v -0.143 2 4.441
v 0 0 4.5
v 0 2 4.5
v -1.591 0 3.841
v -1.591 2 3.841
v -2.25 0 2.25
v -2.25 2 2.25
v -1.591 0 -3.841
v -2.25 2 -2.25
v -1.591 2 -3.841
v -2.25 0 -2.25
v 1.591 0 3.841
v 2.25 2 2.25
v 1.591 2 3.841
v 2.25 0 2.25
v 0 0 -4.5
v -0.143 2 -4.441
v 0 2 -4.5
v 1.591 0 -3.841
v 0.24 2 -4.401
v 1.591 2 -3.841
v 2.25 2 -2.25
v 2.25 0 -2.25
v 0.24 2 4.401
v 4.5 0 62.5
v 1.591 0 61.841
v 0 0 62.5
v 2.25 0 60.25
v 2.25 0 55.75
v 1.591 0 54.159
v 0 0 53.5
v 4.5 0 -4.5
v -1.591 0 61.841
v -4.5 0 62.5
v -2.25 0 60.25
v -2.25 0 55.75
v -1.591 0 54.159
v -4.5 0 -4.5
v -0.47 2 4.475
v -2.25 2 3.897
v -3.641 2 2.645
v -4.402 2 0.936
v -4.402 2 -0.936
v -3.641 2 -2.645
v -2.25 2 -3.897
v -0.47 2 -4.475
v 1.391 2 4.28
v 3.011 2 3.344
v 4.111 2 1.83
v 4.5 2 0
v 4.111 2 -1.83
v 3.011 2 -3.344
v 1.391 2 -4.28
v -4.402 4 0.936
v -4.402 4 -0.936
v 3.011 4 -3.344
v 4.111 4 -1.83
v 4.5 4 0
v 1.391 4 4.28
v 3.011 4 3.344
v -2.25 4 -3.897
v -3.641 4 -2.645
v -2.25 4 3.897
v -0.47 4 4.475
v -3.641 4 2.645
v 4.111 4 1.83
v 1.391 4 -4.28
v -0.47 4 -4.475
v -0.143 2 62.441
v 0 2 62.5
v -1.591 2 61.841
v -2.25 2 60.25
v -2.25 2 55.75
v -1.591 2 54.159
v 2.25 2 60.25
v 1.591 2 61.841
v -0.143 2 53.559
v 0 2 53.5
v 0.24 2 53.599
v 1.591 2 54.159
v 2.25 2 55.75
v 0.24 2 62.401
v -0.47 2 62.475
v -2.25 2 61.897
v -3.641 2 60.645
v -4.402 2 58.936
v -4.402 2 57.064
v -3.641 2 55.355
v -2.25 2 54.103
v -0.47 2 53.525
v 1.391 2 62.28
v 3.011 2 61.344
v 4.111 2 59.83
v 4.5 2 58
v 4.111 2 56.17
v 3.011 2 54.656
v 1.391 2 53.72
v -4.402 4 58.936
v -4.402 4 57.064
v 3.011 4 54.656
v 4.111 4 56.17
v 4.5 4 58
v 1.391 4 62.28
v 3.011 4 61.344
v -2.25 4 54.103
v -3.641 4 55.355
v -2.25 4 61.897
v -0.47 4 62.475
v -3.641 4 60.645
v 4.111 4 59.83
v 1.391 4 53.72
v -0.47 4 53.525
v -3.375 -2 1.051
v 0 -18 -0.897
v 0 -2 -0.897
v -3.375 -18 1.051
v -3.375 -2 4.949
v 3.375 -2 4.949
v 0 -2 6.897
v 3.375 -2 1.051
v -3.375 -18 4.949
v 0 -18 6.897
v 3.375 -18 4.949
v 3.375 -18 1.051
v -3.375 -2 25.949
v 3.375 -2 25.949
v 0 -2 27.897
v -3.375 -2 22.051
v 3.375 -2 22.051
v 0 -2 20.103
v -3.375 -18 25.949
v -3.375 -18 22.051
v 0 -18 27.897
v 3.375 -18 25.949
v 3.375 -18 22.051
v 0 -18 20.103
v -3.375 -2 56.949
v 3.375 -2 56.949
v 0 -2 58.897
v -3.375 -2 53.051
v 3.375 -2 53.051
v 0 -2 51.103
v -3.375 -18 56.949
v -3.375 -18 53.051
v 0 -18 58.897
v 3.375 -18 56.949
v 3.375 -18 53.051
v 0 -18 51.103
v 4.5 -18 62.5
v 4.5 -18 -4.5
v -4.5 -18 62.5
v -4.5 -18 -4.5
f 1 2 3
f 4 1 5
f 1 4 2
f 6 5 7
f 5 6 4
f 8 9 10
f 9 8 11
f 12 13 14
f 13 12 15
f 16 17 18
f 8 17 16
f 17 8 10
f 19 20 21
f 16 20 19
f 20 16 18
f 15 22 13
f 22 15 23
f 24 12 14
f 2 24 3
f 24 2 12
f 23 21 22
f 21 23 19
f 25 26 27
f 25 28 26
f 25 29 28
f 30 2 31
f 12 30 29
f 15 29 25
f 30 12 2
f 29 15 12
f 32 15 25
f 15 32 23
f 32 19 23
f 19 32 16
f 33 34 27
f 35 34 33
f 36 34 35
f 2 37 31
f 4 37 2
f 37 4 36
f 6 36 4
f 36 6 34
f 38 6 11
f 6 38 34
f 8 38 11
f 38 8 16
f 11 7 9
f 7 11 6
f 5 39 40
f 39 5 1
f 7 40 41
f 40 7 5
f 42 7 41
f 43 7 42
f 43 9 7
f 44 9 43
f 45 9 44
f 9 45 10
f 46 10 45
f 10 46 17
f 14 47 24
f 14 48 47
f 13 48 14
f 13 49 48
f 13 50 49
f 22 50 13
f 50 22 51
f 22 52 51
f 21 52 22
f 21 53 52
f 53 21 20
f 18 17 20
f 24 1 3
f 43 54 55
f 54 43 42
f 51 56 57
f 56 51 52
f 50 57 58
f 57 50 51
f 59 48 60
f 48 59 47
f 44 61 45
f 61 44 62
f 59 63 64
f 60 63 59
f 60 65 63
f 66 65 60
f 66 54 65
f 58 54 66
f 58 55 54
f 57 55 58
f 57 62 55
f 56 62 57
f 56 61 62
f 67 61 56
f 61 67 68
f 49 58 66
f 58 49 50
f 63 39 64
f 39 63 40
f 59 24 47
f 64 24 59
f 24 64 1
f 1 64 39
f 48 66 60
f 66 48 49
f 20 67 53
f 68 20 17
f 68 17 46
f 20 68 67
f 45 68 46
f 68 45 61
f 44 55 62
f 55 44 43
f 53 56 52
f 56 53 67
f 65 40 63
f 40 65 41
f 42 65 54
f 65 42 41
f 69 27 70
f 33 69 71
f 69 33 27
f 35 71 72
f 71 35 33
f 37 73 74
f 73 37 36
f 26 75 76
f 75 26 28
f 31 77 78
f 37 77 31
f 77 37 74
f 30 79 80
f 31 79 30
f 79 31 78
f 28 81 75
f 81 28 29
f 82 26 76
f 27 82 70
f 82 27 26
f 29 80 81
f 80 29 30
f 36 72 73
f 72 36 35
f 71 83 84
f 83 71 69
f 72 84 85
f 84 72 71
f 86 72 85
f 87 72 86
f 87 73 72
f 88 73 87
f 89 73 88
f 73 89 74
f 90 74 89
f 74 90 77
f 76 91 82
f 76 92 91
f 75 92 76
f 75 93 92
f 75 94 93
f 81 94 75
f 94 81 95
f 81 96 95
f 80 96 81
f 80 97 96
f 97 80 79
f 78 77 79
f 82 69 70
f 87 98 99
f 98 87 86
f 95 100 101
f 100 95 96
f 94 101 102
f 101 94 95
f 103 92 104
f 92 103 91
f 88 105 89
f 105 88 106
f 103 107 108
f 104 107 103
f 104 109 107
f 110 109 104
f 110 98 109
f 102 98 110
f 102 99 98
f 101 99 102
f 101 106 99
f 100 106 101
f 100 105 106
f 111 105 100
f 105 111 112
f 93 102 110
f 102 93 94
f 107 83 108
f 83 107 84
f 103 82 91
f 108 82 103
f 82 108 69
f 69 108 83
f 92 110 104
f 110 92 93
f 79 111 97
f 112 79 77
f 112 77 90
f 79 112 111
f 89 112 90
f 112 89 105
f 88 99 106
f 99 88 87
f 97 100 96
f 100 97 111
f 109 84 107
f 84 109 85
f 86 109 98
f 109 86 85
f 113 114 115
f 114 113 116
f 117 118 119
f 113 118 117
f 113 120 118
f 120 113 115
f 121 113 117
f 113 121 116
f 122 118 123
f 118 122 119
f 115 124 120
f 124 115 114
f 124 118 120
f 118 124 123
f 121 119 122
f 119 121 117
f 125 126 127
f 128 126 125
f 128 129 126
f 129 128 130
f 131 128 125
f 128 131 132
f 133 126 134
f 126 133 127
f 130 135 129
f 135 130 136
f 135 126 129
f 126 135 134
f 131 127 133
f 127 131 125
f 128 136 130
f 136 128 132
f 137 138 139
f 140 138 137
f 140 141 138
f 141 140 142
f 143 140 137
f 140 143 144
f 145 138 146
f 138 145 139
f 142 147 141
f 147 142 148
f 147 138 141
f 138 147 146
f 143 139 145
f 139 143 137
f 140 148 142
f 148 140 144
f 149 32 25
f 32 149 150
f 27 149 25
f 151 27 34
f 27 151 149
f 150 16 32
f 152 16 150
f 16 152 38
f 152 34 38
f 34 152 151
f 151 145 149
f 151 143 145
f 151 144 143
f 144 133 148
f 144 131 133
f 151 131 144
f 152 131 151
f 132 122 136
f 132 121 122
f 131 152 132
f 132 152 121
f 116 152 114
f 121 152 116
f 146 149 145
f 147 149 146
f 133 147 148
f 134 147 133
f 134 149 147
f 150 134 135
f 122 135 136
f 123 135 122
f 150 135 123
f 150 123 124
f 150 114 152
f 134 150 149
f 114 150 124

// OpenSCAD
// file: peg.scad
pegSlot = 5; // the small opening it slides into
pegD = 9;    // the large opening to put it into
pegH = 22;   // top of large opening to bottom of small opening

holeD = 3.75; // "screw" holes

holeSpacingX = 15;
holeSpacingY = 14.5; // yes, this is actually not a grid. go figure
pegSpacingX = 3 * holeSpacingX;
pegSpacingY = 4 * holeSpacingY;

module peg(t = 2, clearance = 2)
{
    D = pegD;
    d = 4.5;

    rotate([ -90, 0, 0 ])
    {
        hull()
        {
            translate([ 0, (D - d) / 2, 0 ]) cylinder(h = clearance, d = d);
            translate([ 0, -(D - d) / 2, 0 ]) cylinder(h = clearance, d = d);
        }
        translate([ 0, 0, clearance ]) cylinder(h = t, d = D);
    }
}

module pegs(n, t = 2, clearance = 2)
{
    pegSpacingX = 45;
    x0 = ((1 - n) * pegSpacingX) / 2;
    for (i = [0:(n - 1)])
    {
        translate([ x0 + i * pegSpacingX, 0, 0 ]) peg(t, clearance);
    }
}
// file: hexHolder.scad
include <peg.scad>;

function subsum(list, i, n) = i < n ? list[i] + subsum(list, i + 1, n) : 0;

module hexHolder(radiuses, pegs, spacing, depth, margin, t, pegSpacing, width = pegD)
{
    hole = (25.4 / 4 + 2 * margin) * 2 / sqrt(3);
    H = t + depth;

    l = subsum(radiuses, 0, len(radiuses)) + spacing * (len(radiuses) - 1) - radiuses[0] / 2 -
        radiuses[len(radiuses) - 1] / 2;
    L = pegD + (pegs - 1) * pegSpacing;

    difference()
    {
        translate([ -width / 2, -H, -pegD / 2 ]) cube([ width, H, L ]);

        for (i = [0:len(radiuses) - 1])
        {
            z = (L - l) / 2 - pegD / 2 - radiuses[0] / 2 + i * spacing + subsum(radiuses, 0, i + 1) - radiuses[i] / 2;
            translate([ 0, -t, z ]) rotate([ 90, 90, 0 ]) cylinder(h = H, d = hole, $fn = 6);
        }
    }
}

module verticalHexHolder(radiuses, pegs, spacing = 5, depth = 16, margin = 0.2, t = 2, width=pegD)
{
    for (i = [0:pegs - 1])
        translate([ 0, 0, i * pegSpacingY ]) peg(t);
    hexHolder(radiuses, pegs, spacing, depth, margin, t, pegSpacingY, width);
}

module horizontalHexHolder(radiuses, pegs, spacing = 5, depth = 16, margin = 0.2, t = 2, width = pegD)
{
    for (i = [0:pegs - 1])
        translate([ i * pegSpacingX, 0, 0]) peg(t);
    rotate([0,90,0]) hexHolder(radiuses, pegs, spacing, depth, margin, t, pegSpacingX, width);
}
// main file
include <hexHolder.scad>;
verticalHexHolder([12, 20, 32], 2);
